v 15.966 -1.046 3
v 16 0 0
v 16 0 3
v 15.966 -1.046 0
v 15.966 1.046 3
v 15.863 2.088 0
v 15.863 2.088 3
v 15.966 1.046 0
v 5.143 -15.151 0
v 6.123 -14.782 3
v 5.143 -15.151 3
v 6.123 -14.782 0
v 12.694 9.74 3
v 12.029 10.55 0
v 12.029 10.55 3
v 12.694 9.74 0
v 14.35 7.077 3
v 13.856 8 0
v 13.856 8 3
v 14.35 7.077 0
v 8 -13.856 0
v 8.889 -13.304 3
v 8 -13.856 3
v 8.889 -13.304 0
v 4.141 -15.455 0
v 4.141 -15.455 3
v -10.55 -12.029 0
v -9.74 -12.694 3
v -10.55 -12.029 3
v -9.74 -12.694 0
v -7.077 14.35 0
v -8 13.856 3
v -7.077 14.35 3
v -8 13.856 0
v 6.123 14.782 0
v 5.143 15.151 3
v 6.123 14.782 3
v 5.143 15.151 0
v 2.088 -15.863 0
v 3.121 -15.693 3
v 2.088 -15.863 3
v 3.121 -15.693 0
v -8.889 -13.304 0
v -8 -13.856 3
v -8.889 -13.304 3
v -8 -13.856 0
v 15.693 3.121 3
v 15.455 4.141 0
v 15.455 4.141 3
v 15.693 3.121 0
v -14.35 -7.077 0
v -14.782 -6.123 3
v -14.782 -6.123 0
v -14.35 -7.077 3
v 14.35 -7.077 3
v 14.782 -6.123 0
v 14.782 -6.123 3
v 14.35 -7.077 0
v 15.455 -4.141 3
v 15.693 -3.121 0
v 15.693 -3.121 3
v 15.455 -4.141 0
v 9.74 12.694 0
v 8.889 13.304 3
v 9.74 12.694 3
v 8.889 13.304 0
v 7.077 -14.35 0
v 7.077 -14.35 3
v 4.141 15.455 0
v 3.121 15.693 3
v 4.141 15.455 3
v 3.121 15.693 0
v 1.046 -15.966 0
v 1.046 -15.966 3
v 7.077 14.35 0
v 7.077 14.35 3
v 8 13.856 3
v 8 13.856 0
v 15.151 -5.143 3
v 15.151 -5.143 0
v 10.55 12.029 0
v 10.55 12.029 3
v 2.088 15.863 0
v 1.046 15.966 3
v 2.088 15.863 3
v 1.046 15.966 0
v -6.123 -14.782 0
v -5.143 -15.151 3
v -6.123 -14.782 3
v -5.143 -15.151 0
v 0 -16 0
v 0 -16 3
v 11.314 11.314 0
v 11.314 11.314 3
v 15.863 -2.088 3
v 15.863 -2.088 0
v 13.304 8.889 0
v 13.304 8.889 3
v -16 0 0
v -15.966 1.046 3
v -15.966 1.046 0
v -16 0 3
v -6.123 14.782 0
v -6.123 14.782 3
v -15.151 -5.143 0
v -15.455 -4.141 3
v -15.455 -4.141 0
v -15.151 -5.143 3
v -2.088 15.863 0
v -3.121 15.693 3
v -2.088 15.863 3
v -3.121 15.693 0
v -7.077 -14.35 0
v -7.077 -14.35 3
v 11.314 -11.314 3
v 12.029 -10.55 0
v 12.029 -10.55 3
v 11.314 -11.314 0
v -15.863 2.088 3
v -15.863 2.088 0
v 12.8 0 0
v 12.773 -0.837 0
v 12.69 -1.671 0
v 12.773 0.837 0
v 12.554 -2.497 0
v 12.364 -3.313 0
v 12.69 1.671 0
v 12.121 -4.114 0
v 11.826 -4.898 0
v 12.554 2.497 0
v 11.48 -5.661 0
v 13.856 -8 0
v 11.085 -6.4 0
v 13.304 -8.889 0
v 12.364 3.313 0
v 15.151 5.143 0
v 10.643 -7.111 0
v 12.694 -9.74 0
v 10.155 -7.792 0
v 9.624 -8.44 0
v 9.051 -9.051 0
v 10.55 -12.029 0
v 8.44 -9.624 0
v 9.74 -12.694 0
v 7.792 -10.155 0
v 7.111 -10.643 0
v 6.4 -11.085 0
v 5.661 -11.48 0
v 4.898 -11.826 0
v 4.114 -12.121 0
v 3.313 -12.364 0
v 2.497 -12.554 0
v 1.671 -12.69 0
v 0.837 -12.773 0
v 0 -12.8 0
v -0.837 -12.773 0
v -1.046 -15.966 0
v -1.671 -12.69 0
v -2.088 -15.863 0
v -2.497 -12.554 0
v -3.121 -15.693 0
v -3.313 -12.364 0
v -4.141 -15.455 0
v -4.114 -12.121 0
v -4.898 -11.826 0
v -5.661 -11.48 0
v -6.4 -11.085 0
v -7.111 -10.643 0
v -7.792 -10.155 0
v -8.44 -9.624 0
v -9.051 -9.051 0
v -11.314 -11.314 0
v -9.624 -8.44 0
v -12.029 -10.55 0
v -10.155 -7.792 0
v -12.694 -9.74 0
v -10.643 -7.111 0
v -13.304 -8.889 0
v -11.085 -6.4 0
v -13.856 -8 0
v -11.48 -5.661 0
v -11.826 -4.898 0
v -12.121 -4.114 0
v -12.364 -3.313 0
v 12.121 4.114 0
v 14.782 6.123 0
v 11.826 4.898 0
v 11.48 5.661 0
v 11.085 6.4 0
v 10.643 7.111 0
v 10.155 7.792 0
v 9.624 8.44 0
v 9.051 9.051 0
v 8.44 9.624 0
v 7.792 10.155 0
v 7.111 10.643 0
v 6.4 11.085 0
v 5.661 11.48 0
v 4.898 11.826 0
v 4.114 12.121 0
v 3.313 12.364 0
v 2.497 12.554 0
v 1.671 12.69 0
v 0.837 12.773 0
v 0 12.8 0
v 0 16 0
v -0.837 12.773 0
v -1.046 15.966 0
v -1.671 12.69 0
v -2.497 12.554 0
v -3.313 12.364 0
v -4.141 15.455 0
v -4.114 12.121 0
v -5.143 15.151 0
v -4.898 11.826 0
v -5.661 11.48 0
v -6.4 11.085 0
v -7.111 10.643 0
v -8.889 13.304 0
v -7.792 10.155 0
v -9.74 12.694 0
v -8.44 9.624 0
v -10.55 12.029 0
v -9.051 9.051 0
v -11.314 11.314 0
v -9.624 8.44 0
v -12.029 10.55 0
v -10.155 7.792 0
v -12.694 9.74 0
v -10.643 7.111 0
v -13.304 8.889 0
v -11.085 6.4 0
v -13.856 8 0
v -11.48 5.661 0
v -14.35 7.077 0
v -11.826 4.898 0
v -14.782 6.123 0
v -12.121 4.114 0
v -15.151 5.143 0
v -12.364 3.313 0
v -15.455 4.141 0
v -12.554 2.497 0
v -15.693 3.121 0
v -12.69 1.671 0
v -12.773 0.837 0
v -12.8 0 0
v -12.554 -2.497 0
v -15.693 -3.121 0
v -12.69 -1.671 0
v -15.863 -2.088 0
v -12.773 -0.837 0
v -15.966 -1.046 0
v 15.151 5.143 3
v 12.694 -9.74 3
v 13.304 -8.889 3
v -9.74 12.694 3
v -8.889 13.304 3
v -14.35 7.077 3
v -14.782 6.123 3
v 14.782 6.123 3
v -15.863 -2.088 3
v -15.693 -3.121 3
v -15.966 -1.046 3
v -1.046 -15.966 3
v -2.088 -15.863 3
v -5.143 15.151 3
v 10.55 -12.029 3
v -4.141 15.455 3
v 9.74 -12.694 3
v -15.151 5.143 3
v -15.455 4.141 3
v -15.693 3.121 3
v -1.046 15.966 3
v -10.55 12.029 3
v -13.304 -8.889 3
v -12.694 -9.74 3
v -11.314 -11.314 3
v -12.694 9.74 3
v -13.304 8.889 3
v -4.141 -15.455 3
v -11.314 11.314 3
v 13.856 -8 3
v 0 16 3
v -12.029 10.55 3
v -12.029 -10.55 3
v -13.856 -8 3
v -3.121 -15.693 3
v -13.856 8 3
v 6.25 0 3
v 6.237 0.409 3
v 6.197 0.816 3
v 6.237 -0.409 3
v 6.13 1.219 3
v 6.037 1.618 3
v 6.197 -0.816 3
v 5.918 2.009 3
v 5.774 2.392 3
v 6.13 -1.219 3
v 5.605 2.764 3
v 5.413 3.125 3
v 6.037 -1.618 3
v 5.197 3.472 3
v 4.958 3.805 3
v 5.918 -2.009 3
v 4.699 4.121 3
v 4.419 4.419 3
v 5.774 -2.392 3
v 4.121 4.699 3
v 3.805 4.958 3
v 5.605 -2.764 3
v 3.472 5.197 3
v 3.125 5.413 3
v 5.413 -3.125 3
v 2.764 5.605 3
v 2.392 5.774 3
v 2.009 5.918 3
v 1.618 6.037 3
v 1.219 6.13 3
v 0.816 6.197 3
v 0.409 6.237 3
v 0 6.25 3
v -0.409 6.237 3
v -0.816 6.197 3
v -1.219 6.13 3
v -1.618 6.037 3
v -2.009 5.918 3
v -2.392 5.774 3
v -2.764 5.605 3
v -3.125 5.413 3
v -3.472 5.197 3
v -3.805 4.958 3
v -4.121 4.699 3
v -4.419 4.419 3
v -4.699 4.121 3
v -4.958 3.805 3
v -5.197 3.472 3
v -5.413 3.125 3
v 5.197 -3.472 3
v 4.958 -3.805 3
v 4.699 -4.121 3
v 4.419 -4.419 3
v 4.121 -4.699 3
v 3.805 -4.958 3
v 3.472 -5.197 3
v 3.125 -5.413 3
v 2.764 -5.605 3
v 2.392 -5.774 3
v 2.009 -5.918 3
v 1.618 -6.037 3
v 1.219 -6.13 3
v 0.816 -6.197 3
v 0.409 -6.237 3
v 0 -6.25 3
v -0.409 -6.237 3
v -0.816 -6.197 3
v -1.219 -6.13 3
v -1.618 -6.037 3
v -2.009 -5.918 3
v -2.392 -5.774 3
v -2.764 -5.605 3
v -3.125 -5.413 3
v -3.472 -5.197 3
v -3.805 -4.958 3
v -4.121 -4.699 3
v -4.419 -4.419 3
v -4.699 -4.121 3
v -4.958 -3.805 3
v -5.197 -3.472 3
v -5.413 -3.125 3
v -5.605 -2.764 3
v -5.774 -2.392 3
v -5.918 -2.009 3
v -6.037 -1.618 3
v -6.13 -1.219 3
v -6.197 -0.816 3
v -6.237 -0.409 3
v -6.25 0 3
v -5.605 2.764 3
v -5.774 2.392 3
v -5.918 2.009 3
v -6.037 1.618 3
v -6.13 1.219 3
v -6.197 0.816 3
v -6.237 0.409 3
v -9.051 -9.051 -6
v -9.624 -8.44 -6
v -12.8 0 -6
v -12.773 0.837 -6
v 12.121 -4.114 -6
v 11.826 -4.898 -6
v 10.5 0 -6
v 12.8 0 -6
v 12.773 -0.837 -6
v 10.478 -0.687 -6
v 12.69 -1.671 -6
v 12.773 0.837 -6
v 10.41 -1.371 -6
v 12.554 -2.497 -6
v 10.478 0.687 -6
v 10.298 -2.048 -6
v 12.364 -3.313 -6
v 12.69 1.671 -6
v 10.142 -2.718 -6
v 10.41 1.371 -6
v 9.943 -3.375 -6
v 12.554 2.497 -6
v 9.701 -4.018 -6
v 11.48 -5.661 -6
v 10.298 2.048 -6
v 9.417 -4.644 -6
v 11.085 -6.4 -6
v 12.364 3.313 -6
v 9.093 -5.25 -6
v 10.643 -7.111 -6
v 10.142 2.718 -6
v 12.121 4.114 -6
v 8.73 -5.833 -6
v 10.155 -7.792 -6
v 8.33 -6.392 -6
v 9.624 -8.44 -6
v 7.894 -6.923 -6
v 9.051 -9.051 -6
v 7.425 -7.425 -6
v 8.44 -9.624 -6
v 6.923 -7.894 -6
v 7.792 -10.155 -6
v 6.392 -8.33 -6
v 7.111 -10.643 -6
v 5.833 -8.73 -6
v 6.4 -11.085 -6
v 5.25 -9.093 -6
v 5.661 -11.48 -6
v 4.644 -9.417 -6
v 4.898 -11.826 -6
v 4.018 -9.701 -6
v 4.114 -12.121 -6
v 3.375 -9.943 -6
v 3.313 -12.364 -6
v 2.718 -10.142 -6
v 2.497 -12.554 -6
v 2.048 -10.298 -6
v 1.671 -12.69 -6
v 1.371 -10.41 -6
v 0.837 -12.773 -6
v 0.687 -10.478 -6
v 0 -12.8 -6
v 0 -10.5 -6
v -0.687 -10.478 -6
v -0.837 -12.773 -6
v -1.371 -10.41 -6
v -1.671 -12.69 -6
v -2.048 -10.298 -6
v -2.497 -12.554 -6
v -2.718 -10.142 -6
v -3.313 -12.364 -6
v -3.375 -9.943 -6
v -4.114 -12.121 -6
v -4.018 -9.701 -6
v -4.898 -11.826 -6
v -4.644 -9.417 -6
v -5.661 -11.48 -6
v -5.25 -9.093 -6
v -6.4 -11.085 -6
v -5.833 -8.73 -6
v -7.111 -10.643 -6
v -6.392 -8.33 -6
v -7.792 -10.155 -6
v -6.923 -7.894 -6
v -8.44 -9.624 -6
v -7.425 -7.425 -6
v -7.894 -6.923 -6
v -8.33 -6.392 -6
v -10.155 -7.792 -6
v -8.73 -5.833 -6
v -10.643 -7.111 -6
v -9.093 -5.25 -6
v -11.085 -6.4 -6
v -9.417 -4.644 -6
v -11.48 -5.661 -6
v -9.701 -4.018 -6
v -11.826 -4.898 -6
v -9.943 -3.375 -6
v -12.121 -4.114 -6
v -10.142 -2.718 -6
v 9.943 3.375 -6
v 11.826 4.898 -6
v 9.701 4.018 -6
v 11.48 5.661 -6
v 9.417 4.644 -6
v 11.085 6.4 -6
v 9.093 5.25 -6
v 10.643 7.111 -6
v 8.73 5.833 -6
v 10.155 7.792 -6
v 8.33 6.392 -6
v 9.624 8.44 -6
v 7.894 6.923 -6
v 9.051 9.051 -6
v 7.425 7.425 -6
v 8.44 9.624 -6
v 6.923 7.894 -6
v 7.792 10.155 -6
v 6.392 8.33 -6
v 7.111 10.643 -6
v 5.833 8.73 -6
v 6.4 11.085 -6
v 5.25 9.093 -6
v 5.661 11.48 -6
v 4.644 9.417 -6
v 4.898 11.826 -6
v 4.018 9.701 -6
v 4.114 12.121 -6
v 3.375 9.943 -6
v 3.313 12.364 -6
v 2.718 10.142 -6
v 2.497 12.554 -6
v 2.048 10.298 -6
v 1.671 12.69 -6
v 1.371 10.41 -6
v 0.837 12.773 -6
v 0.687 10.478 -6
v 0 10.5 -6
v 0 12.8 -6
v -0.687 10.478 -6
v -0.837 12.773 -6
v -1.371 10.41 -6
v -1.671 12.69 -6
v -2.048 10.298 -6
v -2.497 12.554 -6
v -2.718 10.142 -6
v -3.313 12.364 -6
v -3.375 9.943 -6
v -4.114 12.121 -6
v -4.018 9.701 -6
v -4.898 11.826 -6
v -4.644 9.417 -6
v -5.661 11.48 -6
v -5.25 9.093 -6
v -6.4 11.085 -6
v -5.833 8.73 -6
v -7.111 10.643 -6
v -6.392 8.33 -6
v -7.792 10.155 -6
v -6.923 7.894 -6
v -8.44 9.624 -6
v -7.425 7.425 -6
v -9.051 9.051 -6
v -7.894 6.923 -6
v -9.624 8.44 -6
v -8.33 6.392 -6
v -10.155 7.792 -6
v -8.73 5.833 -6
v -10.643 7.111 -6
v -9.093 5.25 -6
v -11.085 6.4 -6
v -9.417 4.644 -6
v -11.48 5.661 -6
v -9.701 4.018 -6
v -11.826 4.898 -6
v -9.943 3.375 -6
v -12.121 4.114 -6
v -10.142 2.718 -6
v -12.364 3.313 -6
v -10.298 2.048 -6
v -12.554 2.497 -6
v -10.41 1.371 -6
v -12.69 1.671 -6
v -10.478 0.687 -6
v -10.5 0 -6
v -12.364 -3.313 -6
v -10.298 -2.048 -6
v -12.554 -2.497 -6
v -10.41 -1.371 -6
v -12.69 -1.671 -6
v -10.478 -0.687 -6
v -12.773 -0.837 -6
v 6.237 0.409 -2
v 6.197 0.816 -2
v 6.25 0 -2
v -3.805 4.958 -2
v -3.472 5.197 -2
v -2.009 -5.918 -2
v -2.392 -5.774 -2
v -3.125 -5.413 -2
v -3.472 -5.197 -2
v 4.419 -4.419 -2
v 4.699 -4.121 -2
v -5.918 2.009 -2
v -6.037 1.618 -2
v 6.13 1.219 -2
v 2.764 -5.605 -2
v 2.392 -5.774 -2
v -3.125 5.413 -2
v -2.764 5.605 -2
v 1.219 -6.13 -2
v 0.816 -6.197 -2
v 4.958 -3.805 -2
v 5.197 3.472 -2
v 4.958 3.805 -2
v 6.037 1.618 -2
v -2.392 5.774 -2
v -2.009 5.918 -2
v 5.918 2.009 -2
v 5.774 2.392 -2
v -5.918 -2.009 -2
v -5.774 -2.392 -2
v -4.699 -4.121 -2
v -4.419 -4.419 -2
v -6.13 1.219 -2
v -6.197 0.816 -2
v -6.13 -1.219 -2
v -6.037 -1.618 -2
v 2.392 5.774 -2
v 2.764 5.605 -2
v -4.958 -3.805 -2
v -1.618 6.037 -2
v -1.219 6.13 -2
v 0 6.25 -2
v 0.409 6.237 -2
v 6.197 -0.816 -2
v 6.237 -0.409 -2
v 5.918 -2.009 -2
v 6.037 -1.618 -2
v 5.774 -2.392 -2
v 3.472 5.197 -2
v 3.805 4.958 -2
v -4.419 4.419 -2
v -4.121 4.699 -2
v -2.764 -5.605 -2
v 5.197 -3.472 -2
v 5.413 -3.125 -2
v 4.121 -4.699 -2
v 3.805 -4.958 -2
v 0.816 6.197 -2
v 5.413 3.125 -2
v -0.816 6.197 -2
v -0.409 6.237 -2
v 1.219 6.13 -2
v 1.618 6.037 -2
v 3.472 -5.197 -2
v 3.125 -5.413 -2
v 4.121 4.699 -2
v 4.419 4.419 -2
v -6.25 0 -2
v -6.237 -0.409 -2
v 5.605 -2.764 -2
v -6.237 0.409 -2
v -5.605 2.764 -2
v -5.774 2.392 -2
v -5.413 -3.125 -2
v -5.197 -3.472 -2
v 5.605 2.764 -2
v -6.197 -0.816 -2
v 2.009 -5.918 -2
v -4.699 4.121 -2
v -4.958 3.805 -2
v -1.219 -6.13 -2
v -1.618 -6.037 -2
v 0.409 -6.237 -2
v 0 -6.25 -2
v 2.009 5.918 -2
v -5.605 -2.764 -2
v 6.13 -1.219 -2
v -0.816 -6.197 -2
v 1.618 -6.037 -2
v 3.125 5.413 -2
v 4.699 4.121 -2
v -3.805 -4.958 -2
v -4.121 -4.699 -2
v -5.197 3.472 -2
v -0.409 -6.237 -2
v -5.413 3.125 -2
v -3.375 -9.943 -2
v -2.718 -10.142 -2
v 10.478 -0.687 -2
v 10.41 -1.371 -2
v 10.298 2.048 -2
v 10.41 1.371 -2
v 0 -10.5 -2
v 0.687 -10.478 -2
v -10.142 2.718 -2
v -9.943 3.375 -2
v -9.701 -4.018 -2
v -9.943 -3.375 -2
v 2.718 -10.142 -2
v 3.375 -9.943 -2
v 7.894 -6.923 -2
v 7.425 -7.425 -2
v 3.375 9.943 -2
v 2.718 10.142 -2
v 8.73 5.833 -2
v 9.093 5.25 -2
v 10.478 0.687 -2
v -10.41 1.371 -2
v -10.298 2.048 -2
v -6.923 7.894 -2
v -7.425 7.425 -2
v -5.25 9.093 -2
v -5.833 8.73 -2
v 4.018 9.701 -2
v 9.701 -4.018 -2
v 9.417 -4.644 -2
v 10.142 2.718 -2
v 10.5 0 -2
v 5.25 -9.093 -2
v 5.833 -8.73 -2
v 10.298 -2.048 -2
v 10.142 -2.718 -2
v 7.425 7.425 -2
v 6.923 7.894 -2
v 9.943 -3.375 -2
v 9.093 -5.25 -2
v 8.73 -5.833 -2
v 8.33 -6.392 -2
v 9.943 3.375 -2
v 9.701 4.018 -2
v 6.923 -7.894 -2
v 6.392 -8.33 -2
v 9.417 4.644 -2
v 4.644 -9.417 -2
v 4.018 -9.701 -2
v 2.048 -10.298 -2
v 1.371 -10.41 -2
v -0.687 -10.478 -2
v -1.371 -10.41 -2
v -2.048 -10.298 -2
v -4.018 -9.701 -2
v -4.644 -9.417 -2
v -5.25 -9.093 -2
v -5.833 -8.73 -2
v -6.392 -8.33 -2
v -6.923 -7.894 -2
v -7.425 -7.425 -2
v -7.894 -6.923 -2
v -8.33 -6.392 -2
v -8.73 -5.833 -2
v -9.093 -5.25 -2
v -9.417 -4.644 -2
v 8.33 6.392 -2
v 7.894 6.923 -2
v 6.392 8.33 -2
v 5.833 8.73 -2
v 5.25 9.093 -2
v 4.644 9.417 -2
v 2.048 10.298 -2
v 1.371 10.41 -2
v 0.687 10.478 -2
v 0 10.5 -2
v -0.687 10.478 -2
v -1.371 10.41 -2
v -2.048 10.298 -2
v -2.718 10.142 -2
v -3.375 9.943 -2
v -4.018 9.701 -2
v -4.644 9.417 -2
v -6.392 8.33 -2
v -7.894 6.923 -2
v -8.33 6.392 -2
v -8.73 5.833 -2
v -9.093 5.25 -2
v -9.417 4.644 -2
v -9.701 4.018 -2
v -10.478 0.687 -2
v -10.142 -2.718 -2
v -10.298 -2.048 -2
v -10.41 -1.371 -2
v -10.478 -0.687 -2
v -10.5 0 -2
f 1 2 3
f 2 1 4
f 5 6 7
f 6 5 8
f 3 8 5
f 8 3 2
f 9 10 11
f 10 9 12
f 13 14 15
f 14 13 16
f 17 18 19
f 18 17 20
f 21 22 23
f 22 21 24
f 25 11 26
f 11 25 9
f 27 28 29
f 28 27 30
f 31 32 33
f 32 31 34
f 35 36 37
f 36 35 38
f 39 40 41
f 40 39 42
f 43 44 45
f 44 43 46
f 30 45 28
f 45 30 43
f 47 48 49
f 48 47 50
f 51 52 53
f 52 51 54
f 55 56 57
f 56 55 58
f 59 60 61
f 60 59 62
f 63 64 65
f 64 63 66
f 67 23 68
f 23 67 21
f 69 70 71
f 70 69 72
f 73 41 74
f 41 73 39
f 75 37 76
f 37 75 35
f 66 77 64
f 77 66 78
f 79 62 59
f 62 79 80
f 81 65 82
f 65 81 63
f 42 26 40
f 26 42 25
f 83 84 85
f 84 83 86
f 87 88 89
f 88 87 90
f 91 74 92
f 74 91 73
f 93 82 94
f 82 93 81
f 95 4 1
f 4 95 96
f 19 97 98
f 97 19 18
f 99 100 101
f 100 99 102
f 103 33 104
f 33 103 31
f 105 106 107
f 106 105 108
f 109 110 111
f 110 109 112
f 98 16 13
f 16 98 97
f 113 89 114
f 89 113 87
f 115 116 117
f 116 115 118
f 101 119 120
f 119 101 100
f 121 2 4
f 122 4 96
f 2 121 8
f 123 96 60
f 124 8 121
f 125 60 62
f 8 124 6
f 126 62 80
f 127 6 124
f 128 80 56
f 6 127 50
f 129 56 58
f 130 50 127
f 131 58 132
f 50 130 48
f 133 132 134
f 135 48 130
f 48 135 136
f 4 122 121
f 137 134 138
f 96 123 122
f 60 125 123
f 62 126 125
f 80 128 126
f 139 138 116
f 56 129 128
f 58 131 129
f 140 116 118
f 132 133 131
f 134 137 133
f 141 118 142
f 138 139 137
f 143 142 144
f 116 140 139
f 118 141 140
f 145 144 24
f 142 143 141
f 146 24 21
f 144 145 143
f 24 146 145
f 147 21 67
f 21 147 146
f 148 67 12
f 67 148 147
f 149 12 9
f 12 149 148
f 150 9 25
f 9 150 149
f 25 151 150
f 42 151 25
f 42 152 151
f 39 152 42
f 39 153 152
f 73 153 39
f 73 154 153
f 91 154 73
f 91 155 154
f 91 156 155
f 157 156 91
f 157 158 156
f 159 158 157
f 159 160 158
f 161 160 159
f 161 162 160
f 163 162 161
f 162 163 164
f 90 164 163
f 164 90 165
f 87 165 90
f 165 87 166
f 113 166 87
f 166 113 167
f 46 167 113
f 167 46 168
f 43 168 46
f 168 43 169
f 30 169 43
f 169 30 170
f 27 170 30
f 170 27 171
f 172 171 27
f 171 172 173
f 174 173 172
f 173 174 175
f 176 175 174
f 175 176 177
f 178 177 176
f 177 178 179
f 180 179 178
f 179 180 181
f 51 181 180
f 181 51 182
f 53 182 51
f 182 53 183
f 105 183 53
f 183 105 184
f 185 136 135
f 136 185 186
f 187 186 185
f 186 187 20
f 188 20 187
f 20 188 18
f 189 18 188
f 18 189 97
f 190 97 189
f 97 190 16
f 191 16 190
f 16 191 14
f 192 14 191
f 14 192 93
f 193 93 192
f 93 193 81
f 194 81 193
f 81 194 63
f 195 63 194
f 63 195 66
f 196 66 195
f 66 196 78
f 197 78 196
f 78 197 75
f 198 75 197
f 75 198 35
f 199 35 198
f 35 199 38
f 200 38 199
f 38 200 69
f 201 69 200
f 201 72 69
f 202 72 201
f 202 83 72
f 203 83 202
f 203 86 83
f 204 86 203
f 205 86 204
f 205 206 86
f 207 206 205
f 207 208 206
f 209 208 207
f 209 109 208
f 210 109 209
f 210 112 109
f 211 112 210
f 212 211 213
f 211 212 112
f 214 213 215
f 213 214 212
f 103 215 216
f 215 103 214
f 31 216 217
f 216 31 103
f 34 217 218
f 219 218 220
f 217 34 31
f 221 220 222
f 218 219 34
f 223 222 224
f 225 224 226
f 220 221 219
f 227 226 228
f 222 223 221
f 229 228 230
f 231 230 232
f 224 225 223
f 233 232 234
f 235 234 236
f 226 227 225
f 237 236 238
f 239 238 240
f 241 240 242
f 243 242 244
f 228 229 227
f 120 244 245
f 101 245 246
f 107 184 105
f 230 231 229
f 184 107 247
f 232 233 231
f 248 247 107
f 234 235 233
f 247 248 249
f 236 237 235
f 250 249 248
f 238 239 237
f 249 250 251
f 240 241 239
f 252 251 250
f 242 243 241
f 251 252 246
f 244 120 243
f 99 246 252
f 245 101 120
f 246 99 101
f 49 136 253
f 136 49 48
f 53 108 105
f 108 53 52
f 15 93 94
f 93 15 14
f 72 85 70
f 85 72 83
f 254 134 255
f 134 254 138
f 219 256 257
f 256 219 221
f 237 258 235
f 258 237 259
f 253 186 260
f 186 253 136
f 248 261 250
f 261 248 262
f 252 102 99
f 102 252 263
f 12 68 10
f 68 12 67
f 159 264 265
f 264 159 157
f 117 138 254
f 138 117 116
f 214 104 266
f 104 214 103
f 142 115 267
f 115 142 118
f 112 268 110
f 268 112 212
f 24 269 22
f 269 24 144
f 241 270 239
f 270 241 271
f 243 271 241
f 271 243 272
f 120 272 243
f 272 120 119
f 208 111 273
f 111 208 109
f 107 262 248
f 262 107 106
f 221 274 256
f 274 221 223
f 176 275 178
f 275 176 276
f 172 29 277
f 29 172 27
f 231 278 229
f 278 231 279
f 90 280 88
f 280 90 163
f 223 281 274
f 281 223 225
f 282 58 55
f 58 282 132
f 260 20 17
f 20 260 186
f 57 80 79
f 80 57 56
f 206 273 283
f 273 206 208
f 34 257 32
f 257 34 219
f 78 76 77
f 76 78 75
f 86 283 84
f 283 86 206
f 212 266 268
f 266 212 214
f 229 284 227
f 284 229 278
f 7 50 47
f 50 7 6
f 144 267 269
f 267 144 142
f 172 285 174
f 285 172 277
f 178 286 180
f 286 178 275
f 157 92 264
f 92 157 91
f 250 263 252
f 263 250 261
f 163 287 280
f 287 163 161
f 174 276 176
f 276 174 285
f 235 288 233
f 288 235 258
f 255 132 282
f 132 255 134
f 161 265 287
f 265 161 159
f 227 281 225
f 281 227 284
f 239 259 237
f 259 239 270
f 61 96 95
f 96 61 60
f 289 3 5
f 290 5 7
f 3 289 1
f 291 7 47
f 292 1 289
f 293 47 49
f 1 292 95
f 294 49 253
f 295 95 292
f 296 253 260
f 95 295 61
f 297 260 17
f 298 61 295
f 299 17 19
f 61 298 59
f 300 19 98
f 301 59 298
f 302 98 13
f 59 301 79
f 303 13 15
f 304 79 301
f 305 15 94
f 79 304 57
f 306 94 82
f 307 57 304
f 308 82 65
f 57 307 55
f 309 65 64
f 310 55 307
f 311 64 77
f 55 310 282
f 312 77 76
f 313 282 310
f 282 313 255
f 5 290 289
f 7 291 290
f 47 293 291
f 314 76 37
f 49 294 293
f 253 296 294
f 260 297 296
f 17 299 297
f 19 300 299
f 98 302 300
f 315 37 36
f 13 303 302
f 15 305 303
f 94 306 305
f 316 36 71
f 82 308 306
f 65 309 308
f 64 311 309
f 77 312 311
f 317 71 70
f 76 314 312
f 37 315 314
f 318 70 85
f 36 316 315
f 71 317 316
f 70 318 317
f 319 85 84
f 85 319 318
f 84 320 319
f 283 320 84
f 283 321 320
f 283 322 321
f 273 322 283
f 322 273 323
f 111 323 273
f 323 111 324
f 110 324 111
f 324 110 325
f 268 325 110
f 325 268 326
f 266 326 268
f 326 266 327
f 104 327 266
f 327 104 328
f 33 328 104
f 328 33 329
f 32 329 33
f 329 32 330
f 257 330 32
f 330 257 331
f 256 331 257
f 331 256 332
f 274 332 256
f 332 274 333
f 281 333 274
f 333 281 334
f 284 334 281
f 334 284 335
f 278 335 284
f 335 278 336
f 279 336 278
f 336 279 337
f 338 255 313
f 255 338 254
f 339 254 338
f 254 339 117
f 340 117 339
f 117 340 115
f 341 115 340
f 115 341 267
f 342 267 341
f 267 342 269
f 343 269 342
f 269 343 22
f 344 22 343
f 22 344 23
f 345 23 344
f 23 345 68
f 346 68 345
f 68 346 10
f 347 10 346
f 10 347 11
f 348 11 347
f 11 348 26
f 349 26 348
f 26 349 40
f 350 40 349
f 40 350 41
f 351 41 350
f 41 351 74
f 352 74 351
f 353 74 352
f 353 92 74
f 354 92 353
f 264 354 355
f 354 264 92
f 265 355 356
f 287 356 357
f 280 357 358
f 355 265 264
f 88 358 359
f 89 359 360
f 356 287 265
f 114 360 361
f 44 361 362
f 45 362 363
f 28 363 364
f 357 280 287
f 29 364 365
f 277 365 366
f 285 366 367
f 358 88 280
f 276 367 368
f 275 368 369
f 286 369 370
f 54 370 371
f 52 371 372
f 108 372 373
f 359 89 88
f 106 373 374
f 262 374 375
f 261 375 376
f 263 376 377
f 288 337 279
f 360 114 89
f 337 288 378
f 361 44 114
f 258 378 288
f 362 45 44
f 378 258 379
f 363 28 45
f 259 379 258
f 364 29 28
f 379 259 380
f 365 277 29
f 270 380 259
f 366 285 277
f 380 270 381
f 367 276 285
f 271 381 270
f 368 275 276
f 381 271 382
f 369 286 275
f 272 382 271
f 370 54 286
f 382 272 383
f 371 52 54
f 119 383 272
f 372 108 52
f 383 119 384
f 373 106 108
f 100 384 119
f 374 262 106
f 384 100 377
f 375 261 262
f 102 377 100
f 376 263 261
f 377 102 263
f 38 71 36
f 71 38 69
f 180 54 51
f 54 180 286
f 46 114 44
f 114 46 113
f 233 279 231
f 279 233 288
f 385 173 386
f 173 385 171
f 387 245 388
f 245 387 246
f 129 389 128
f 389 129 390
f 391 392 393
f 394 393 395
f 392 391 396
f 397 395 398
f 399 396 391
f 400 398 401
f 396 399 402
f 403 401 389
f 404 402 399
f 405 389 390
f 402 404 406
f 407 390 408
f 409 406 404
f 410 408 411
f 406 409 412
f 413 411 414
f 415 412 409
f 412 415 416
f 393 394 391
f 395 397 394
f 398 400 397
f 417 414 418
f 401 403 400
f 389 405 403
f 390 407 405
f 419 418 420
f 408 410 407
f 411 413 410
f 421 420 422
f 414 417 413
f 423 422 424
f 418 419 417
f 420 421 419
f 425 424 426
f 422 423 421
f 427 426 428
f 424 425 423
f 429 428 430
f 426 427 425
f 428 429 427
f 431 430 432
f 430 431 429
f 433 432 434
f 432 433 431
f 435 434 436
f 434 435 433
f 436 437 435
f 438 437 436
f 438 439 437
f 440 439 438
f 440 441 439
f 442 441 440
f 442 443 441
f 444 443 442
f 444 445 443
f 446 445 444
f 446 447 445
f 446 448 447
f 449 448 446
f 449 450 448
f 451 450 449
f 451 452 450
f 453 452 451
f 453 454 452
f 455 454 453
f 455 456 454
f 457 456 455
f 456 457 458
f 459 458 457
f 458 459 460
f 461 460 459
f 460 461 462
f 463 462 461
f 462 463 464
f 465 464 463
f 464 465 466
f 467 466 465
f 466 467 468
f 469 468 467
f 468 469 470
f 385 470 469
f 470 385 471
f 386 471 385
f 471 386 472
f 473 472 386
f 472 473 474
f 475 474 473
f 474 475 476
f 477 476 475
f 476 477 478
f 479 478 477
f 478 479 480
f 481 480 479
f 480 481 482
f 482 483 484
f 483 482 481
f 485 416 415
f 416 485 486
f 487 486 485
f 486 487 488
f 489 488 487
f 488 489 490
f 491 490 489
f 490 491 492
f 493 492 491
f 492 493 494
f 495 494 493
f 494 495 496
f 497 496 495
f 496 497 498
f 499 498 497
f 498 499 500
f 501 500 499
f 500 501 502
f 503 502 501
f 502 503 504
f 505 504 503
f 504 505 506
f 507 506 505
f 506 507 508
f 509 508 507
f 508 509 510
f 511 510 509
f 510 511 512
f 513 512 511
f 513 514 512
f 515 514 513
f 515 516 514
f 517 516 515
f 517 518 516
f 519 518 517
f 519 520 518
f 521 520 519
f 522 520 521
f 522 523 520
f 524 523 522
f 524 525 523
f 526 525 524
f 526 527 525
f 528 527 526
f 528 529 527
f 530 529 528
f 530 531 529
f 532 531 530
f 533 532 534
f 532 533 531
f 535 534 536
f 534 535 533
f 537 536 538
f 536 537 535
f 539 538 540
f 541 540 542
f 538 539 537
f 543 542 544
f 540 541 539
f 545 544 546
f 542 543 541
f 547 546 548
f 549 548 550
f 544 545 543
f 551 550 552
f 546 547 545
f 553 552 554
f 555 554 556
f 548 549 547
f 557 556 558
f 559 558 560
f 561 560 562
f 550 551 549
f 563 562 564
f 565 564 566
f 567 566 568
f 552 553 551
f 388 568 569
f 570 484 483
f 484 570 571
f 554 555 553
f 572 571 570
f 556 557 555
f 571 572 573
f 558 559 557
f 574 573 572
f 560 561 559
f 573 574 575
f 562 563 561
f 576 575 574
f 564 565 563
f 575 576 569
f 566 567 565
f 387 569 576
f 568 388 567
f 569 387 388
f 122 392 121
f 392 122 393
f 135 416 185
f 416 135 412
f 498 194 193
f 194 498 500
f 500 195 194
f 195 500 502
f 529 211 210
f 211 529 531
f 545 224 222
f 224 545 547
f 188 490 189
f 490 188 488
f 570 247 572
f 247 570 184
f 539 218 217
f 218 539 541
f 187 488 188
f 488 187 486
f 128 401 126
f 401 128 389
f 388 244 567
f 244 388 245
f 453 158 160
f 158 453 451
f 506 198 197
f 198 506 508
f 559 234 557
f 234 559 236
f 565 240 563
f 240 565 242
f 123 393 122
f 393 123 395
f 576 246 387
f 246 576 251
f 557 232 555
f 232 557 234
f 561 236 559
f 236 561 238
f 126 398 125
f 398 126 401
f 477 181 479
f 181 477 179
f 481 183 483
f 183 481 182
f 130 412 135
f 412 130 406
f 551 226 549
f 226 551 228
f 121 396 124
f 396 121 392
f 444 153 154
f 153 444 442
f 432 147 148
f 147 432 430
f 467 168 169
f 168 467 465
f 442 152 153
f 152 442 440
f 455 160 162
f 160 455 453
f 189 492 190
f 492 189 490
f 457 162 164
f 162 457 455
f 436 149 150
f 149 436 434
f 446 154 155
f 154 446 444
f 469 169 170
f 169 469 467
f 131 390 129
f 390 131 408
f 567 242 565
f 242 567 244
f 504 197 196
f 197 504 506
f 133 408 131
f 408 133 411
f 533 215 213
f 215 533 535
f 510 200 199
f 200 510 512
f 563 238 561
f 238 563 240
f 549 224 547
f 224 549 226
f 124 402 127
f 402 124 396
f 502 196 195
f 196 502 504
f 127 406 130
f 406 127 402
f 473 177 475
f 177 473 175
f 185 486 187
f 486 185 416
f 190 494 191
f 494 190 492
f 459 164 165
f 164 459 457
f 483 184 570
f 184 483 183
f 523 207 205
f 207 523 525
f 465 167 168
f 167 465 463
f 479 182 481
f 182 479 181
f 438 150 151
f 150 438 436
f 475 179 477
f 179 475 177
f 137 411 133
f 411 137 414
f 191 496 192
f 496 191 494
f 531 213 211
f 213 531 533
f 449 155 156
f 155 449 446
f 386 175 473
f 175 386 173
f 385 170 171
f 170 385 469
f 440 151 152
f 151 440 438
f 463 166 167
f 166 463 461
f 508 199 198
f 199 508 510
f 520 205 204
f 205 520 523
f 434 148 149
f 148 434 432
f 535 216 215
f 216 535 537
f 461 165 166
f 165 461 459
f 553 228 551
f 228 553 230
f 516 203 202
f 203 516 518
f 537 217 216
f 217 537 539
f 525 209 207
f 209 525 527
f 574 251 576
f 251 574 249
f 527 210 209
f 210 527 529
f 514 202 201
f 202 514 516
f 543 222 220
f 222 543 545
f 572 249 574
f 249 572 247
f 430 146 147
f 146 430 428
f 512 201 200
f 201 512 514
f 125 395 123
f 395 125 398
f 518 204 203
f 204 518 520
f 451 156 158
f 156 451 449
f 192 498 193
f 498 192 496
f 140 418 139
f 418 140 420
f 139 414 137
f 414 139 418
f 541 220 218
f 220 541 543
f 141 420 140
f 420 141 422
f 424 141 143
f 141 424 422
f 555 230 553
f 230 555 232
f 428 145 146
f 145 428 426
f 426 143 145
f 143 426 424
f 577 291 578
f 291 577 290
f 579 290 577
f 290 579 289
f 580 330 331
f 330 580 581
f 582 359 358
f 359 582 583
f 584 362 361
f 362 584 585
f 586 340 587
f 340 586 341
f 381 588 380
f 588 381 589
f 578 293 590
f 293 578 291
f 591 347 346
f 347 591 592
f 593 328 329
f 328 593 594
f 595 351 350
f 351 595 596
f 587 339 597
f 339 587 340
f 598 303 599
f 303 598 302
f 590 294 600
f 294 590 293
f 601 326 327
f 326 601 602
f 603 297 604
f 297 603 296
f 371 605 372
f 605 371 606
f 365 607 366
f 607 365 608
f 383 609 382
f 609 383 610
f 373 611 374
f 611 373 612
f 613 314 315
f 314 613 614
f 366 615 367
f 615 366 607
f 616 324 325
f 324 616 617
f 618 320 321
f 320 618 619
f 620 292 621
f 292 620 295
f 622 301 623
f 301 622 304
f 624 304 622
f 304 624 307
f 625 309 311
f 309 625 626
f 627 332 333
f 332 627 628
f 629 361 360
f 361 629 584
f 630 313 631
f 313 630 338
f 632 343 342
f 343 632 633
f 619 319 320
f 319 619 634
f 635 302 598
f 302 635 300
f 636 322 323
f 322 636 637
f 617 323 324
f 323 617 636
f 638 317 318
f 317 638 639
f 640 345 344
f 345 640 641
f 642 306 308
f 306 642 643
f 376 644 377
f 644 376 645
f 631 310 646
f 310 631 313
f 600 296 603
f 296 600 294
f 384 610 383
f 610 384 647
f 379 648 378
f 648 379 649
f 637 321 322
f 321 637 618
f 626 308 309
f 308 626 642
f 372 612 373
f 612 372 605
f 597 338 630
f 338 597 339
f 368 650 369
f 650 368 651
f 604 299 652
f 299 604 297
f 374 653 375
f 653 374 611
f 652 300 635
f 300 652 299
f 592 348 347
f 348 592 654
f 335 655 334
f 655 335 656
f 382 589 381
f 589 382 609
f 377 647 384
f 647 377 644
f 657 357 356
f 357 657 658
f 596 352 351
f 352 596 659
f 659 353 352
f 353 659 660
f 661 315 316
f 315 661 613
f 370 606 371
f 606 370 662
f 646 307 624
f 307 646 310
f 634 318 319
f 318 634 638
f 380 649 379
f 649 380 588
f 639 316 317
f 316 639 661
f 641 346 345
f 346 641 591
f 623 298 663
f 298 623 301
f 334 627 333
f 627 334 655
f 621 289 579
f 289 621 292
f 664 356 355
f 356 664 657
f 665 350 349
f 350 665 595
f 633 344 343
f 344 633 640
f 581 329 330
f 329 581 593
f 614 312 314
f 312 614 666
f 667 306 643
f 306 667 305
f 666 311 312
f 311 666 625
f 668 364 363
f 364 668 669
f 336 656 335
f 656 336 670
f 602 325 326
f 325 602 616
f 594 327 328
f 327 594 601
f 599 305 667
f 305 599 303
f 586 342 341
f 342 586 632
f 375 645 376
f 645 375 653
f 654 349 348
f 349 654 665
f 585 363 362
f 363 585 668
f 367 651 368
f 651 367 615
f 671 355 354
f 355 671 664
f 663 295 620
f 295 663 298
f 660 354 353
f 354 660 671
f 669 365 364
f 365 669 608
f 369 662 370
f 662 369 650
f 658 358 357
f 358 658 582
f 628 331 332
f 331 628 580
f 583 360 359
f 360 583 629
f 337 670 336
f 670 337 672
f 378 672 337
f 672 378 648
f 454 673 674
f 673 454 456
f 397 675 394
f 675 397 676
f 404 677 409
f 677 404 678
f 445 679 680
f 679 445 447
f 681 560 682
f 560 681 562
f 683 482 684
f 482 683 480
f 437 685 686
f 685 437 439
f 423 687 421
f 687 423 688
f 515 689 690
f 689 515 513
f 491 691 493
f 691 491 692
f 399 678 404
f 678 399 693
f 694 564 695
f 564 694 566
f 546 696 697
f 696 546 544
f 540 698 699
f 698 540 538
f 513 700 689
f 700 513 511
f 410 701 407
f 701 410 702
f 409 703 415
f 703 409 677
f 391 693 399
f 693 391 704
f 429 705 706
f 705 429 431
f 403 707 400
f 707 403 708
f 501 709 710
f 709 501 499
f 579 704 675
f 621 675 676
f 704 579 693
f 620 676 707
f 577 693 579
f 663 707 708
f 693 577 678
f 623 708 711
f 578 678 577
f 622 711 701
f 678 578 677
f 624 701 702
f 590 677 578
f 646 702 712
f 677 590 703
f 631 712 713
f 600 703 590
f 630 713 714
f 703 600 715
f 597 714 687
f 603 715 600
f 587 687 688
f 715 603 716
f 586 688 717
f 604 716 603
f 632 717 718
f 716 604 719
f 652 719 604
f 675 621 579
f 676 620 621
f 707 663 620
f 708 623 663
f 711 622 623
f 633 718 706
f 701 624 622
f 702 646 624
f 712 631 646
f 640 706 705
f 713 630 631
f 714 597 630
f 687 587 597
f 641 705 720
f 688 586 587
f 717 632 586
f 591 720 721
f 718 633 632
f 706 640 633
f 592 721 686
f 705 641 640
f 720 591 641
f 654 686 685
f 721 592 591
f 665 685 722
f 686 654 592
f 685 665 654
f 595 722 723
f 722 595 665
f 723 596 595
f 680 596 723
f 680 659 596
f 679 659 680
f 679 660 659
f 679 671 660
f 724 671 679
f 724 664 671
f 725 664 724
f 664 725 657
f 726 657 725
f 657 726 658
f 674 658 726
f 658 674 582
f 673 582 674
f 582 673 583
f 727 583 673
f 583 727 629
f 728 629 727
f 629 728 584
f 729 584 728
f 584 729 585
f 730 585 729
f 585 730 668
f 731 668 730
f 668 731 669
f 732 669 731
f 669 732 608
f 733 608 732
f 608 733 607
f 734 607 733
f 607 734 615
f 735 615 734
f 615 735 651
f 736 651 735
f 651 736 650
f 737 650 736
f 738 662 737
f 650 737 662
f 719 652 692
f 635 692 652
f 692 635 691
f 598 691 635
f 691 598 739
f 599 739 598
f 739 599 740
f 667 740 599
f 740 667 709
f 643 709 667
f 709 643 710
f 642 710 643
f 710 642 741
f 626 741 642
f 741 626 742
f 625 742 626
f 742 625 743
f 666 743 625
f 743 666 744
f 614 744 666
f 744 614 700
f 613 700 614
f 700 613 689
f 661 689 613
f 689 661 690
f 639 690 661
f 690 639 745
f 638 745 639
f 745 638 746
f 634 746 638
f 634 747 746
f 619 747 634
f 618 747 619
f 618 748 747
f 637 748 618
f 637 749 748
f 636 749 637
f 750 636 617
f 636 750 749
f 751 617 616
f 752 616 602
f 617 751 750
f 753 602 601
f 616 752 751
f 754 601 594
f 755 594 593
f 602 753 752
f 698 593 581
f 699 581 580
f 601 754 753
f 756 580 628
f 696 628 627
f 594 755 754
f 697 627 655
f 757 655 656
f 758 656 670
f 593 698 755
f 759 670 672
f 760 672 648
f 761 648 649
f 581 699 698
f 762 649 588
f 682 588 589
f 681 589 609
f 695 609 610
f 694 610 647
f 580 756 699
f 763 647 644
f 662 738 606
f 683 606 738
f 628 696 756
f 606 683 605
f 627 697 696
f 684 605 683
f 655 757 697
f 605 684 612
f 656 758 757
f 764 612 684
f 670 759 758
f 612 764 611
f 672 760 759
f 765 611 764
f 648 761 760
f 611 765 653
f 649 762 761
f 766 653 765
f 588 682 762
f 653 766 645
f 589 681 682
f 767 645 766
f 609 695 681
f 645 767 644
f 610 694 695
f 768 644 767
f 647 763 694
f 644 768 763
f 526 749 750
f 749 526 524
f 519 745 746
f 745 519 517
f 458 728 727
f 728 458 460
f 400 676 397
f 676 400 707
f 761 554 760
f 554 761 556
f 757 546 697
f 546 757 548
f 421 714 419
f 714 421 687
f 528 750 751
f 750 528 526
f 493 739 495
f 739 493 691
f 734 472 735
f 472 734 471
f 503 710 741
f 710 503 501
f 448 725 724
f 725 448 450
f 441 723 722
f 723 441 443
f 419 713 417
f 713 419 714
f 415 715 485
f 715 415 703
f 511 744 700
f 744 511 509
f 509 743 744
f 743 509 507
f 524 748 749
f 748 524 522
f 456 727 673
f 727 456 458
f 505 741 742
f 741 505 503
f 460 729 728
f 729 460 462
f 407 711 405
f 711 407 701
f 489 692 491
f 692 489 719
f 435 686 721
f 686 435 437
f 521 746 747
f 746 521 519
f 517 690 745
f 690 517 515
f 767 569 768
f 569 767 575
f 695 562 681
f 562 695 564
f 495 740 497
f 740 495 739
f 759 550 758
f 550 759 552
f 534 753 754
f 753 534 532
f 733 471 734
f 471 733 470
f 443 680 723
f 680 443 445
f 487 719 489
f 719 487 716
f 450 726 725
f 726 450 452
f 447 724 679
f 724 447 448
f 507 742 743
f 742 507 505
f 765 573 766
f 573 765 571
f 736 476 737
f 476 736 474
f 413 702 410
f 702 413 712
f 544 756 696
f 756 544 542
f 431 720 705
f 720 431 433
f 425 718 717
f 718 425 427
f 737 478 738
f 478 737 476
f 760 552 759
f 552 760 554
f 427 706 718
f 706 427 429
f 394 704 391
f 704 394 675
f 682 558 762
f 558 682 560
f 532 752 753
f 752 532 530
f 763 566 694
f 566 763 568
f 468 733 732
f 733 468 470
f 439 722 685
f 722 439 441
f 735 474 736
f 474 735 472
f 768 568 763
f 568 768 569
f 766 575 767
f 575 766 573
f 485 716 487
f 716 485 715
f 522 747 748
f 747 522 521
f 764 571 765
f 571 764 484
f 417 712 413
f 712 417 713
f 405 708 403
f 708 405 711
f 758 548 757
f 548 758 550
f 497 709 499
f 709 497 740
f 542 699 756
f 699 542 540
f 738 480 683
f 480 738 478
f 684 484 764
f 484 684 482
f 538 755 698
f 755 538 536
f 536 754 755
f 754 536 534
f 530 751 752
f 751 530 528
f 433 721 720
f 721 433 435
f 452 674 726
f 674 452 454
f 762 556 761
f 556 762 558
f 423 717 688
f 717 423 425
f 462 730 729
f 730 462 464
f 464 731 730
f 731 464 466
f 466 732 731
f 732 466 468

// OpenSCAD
// file: phytohydra_params.scad
// PhytoHydra v1 - shared parameters (all dimensions in mm)
// Open any part file in OpenSCAD (free, openscad.org), press F6, then File > Export > STL.
trunk_d      = 170;   // measure girth with a tape: trunk_d = girth / 3.1416
trunk_r      = trunk_d / 2;
wall         = 2.4;   // printed wall thickness (PA12, ASA or PETG)
strap_w      = 20;    // TPU strap / stainless band width
strap_t      = 2.2;
$fn          = 96;
// main file
// Screw-in style cap (press fit + 2 screws) with PG7 gland hole
include <phytohydra_params.scad>;
difference() {
    union() {
        cylinder(d = 32, h = 3);
        translate([0, 0, -6]) cylinder(d = 25.6, h = 6);   // spigot into housing (26 mm ID)
    }
    translate([0, 0, -7]) cylinder(d = 12.5, h = 12);       // PG7 gland
    translate([0, 0, -7]) cylinder(d = 21, h = 5);          // spring seat recess (sets preload with spigot depth)
}
